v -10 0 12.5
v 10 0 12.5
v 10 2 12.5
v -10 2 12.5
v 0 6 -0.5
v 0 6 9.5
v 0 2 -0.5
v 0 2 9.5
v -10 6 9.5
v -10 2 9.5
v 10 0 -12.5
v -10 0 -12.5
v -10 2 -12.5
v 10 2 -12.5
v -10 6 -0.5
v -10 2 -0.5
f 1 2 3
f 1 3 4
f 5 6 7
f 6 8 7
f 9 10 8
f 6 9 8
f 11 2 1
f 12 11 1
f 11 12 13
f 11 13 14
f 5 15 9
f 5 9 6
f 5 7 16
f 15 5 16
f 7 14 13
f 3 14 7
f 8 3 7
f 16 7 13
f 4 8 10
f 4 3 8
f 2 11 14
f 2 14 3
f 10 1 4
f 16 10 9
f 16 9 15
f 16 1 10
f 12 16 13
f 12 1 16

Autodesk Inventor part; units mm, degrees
ref_plane "YZ Plane" through (0, 0, 0) normal (1, 0, 0) x (0, 1, 0)
ref_plane "XZ Plane" through (0, 0, 0) normal (0, 1, 0) x (-1, 0, 0)
ref_plane "XY Plane" through (0, 0, 0) normal (0, 0, 1) x (1, 0, 0)
sketch "Sketch1" plane through (0, 0, 0) normal (0, 1, 0) x (-1, 0, 0)
  line L0 (-10, 12.5) -> (10, 12.5)
  line L1 (10, 12.5) -> (10, -12.5)
  line L2 (10, -12.5) -> (-10, -12.5)
  line L3 (-10, -12.5) -> (-10, 12.5)
  line L4 (-10, 12.5) -> (10, -12.5) construction
  line L5 (10, 12.5) -> (-10, -12.5) construction
  point P0 (0, 0)
  dimension "d0" = 20
  dimension "d1" = 25
extrude "Extrusion1" add sketch "Sketch1" along normal blind 2
sketch "Sketch2" plane through (0, 2, 0) normal (0, 1, 0) x (1, 0, 0)
  line L0 (-10, -9.5) -> (0, -9.5)
  line L1 (0, -9.5) -> (0, 0.5)
  line L2 (0, 0.5) -> (-10, 0.5)
  line L3 (-10, 0.5) -> (-10, -9.5)
  point P0 (0, 0)
  dimension "d4" = 10
  dimension "d5" = 10
extrude "Extrusion2" add sketch "Sketch2" along normal blind 4
properties part number "POWER_DELIVERY"
